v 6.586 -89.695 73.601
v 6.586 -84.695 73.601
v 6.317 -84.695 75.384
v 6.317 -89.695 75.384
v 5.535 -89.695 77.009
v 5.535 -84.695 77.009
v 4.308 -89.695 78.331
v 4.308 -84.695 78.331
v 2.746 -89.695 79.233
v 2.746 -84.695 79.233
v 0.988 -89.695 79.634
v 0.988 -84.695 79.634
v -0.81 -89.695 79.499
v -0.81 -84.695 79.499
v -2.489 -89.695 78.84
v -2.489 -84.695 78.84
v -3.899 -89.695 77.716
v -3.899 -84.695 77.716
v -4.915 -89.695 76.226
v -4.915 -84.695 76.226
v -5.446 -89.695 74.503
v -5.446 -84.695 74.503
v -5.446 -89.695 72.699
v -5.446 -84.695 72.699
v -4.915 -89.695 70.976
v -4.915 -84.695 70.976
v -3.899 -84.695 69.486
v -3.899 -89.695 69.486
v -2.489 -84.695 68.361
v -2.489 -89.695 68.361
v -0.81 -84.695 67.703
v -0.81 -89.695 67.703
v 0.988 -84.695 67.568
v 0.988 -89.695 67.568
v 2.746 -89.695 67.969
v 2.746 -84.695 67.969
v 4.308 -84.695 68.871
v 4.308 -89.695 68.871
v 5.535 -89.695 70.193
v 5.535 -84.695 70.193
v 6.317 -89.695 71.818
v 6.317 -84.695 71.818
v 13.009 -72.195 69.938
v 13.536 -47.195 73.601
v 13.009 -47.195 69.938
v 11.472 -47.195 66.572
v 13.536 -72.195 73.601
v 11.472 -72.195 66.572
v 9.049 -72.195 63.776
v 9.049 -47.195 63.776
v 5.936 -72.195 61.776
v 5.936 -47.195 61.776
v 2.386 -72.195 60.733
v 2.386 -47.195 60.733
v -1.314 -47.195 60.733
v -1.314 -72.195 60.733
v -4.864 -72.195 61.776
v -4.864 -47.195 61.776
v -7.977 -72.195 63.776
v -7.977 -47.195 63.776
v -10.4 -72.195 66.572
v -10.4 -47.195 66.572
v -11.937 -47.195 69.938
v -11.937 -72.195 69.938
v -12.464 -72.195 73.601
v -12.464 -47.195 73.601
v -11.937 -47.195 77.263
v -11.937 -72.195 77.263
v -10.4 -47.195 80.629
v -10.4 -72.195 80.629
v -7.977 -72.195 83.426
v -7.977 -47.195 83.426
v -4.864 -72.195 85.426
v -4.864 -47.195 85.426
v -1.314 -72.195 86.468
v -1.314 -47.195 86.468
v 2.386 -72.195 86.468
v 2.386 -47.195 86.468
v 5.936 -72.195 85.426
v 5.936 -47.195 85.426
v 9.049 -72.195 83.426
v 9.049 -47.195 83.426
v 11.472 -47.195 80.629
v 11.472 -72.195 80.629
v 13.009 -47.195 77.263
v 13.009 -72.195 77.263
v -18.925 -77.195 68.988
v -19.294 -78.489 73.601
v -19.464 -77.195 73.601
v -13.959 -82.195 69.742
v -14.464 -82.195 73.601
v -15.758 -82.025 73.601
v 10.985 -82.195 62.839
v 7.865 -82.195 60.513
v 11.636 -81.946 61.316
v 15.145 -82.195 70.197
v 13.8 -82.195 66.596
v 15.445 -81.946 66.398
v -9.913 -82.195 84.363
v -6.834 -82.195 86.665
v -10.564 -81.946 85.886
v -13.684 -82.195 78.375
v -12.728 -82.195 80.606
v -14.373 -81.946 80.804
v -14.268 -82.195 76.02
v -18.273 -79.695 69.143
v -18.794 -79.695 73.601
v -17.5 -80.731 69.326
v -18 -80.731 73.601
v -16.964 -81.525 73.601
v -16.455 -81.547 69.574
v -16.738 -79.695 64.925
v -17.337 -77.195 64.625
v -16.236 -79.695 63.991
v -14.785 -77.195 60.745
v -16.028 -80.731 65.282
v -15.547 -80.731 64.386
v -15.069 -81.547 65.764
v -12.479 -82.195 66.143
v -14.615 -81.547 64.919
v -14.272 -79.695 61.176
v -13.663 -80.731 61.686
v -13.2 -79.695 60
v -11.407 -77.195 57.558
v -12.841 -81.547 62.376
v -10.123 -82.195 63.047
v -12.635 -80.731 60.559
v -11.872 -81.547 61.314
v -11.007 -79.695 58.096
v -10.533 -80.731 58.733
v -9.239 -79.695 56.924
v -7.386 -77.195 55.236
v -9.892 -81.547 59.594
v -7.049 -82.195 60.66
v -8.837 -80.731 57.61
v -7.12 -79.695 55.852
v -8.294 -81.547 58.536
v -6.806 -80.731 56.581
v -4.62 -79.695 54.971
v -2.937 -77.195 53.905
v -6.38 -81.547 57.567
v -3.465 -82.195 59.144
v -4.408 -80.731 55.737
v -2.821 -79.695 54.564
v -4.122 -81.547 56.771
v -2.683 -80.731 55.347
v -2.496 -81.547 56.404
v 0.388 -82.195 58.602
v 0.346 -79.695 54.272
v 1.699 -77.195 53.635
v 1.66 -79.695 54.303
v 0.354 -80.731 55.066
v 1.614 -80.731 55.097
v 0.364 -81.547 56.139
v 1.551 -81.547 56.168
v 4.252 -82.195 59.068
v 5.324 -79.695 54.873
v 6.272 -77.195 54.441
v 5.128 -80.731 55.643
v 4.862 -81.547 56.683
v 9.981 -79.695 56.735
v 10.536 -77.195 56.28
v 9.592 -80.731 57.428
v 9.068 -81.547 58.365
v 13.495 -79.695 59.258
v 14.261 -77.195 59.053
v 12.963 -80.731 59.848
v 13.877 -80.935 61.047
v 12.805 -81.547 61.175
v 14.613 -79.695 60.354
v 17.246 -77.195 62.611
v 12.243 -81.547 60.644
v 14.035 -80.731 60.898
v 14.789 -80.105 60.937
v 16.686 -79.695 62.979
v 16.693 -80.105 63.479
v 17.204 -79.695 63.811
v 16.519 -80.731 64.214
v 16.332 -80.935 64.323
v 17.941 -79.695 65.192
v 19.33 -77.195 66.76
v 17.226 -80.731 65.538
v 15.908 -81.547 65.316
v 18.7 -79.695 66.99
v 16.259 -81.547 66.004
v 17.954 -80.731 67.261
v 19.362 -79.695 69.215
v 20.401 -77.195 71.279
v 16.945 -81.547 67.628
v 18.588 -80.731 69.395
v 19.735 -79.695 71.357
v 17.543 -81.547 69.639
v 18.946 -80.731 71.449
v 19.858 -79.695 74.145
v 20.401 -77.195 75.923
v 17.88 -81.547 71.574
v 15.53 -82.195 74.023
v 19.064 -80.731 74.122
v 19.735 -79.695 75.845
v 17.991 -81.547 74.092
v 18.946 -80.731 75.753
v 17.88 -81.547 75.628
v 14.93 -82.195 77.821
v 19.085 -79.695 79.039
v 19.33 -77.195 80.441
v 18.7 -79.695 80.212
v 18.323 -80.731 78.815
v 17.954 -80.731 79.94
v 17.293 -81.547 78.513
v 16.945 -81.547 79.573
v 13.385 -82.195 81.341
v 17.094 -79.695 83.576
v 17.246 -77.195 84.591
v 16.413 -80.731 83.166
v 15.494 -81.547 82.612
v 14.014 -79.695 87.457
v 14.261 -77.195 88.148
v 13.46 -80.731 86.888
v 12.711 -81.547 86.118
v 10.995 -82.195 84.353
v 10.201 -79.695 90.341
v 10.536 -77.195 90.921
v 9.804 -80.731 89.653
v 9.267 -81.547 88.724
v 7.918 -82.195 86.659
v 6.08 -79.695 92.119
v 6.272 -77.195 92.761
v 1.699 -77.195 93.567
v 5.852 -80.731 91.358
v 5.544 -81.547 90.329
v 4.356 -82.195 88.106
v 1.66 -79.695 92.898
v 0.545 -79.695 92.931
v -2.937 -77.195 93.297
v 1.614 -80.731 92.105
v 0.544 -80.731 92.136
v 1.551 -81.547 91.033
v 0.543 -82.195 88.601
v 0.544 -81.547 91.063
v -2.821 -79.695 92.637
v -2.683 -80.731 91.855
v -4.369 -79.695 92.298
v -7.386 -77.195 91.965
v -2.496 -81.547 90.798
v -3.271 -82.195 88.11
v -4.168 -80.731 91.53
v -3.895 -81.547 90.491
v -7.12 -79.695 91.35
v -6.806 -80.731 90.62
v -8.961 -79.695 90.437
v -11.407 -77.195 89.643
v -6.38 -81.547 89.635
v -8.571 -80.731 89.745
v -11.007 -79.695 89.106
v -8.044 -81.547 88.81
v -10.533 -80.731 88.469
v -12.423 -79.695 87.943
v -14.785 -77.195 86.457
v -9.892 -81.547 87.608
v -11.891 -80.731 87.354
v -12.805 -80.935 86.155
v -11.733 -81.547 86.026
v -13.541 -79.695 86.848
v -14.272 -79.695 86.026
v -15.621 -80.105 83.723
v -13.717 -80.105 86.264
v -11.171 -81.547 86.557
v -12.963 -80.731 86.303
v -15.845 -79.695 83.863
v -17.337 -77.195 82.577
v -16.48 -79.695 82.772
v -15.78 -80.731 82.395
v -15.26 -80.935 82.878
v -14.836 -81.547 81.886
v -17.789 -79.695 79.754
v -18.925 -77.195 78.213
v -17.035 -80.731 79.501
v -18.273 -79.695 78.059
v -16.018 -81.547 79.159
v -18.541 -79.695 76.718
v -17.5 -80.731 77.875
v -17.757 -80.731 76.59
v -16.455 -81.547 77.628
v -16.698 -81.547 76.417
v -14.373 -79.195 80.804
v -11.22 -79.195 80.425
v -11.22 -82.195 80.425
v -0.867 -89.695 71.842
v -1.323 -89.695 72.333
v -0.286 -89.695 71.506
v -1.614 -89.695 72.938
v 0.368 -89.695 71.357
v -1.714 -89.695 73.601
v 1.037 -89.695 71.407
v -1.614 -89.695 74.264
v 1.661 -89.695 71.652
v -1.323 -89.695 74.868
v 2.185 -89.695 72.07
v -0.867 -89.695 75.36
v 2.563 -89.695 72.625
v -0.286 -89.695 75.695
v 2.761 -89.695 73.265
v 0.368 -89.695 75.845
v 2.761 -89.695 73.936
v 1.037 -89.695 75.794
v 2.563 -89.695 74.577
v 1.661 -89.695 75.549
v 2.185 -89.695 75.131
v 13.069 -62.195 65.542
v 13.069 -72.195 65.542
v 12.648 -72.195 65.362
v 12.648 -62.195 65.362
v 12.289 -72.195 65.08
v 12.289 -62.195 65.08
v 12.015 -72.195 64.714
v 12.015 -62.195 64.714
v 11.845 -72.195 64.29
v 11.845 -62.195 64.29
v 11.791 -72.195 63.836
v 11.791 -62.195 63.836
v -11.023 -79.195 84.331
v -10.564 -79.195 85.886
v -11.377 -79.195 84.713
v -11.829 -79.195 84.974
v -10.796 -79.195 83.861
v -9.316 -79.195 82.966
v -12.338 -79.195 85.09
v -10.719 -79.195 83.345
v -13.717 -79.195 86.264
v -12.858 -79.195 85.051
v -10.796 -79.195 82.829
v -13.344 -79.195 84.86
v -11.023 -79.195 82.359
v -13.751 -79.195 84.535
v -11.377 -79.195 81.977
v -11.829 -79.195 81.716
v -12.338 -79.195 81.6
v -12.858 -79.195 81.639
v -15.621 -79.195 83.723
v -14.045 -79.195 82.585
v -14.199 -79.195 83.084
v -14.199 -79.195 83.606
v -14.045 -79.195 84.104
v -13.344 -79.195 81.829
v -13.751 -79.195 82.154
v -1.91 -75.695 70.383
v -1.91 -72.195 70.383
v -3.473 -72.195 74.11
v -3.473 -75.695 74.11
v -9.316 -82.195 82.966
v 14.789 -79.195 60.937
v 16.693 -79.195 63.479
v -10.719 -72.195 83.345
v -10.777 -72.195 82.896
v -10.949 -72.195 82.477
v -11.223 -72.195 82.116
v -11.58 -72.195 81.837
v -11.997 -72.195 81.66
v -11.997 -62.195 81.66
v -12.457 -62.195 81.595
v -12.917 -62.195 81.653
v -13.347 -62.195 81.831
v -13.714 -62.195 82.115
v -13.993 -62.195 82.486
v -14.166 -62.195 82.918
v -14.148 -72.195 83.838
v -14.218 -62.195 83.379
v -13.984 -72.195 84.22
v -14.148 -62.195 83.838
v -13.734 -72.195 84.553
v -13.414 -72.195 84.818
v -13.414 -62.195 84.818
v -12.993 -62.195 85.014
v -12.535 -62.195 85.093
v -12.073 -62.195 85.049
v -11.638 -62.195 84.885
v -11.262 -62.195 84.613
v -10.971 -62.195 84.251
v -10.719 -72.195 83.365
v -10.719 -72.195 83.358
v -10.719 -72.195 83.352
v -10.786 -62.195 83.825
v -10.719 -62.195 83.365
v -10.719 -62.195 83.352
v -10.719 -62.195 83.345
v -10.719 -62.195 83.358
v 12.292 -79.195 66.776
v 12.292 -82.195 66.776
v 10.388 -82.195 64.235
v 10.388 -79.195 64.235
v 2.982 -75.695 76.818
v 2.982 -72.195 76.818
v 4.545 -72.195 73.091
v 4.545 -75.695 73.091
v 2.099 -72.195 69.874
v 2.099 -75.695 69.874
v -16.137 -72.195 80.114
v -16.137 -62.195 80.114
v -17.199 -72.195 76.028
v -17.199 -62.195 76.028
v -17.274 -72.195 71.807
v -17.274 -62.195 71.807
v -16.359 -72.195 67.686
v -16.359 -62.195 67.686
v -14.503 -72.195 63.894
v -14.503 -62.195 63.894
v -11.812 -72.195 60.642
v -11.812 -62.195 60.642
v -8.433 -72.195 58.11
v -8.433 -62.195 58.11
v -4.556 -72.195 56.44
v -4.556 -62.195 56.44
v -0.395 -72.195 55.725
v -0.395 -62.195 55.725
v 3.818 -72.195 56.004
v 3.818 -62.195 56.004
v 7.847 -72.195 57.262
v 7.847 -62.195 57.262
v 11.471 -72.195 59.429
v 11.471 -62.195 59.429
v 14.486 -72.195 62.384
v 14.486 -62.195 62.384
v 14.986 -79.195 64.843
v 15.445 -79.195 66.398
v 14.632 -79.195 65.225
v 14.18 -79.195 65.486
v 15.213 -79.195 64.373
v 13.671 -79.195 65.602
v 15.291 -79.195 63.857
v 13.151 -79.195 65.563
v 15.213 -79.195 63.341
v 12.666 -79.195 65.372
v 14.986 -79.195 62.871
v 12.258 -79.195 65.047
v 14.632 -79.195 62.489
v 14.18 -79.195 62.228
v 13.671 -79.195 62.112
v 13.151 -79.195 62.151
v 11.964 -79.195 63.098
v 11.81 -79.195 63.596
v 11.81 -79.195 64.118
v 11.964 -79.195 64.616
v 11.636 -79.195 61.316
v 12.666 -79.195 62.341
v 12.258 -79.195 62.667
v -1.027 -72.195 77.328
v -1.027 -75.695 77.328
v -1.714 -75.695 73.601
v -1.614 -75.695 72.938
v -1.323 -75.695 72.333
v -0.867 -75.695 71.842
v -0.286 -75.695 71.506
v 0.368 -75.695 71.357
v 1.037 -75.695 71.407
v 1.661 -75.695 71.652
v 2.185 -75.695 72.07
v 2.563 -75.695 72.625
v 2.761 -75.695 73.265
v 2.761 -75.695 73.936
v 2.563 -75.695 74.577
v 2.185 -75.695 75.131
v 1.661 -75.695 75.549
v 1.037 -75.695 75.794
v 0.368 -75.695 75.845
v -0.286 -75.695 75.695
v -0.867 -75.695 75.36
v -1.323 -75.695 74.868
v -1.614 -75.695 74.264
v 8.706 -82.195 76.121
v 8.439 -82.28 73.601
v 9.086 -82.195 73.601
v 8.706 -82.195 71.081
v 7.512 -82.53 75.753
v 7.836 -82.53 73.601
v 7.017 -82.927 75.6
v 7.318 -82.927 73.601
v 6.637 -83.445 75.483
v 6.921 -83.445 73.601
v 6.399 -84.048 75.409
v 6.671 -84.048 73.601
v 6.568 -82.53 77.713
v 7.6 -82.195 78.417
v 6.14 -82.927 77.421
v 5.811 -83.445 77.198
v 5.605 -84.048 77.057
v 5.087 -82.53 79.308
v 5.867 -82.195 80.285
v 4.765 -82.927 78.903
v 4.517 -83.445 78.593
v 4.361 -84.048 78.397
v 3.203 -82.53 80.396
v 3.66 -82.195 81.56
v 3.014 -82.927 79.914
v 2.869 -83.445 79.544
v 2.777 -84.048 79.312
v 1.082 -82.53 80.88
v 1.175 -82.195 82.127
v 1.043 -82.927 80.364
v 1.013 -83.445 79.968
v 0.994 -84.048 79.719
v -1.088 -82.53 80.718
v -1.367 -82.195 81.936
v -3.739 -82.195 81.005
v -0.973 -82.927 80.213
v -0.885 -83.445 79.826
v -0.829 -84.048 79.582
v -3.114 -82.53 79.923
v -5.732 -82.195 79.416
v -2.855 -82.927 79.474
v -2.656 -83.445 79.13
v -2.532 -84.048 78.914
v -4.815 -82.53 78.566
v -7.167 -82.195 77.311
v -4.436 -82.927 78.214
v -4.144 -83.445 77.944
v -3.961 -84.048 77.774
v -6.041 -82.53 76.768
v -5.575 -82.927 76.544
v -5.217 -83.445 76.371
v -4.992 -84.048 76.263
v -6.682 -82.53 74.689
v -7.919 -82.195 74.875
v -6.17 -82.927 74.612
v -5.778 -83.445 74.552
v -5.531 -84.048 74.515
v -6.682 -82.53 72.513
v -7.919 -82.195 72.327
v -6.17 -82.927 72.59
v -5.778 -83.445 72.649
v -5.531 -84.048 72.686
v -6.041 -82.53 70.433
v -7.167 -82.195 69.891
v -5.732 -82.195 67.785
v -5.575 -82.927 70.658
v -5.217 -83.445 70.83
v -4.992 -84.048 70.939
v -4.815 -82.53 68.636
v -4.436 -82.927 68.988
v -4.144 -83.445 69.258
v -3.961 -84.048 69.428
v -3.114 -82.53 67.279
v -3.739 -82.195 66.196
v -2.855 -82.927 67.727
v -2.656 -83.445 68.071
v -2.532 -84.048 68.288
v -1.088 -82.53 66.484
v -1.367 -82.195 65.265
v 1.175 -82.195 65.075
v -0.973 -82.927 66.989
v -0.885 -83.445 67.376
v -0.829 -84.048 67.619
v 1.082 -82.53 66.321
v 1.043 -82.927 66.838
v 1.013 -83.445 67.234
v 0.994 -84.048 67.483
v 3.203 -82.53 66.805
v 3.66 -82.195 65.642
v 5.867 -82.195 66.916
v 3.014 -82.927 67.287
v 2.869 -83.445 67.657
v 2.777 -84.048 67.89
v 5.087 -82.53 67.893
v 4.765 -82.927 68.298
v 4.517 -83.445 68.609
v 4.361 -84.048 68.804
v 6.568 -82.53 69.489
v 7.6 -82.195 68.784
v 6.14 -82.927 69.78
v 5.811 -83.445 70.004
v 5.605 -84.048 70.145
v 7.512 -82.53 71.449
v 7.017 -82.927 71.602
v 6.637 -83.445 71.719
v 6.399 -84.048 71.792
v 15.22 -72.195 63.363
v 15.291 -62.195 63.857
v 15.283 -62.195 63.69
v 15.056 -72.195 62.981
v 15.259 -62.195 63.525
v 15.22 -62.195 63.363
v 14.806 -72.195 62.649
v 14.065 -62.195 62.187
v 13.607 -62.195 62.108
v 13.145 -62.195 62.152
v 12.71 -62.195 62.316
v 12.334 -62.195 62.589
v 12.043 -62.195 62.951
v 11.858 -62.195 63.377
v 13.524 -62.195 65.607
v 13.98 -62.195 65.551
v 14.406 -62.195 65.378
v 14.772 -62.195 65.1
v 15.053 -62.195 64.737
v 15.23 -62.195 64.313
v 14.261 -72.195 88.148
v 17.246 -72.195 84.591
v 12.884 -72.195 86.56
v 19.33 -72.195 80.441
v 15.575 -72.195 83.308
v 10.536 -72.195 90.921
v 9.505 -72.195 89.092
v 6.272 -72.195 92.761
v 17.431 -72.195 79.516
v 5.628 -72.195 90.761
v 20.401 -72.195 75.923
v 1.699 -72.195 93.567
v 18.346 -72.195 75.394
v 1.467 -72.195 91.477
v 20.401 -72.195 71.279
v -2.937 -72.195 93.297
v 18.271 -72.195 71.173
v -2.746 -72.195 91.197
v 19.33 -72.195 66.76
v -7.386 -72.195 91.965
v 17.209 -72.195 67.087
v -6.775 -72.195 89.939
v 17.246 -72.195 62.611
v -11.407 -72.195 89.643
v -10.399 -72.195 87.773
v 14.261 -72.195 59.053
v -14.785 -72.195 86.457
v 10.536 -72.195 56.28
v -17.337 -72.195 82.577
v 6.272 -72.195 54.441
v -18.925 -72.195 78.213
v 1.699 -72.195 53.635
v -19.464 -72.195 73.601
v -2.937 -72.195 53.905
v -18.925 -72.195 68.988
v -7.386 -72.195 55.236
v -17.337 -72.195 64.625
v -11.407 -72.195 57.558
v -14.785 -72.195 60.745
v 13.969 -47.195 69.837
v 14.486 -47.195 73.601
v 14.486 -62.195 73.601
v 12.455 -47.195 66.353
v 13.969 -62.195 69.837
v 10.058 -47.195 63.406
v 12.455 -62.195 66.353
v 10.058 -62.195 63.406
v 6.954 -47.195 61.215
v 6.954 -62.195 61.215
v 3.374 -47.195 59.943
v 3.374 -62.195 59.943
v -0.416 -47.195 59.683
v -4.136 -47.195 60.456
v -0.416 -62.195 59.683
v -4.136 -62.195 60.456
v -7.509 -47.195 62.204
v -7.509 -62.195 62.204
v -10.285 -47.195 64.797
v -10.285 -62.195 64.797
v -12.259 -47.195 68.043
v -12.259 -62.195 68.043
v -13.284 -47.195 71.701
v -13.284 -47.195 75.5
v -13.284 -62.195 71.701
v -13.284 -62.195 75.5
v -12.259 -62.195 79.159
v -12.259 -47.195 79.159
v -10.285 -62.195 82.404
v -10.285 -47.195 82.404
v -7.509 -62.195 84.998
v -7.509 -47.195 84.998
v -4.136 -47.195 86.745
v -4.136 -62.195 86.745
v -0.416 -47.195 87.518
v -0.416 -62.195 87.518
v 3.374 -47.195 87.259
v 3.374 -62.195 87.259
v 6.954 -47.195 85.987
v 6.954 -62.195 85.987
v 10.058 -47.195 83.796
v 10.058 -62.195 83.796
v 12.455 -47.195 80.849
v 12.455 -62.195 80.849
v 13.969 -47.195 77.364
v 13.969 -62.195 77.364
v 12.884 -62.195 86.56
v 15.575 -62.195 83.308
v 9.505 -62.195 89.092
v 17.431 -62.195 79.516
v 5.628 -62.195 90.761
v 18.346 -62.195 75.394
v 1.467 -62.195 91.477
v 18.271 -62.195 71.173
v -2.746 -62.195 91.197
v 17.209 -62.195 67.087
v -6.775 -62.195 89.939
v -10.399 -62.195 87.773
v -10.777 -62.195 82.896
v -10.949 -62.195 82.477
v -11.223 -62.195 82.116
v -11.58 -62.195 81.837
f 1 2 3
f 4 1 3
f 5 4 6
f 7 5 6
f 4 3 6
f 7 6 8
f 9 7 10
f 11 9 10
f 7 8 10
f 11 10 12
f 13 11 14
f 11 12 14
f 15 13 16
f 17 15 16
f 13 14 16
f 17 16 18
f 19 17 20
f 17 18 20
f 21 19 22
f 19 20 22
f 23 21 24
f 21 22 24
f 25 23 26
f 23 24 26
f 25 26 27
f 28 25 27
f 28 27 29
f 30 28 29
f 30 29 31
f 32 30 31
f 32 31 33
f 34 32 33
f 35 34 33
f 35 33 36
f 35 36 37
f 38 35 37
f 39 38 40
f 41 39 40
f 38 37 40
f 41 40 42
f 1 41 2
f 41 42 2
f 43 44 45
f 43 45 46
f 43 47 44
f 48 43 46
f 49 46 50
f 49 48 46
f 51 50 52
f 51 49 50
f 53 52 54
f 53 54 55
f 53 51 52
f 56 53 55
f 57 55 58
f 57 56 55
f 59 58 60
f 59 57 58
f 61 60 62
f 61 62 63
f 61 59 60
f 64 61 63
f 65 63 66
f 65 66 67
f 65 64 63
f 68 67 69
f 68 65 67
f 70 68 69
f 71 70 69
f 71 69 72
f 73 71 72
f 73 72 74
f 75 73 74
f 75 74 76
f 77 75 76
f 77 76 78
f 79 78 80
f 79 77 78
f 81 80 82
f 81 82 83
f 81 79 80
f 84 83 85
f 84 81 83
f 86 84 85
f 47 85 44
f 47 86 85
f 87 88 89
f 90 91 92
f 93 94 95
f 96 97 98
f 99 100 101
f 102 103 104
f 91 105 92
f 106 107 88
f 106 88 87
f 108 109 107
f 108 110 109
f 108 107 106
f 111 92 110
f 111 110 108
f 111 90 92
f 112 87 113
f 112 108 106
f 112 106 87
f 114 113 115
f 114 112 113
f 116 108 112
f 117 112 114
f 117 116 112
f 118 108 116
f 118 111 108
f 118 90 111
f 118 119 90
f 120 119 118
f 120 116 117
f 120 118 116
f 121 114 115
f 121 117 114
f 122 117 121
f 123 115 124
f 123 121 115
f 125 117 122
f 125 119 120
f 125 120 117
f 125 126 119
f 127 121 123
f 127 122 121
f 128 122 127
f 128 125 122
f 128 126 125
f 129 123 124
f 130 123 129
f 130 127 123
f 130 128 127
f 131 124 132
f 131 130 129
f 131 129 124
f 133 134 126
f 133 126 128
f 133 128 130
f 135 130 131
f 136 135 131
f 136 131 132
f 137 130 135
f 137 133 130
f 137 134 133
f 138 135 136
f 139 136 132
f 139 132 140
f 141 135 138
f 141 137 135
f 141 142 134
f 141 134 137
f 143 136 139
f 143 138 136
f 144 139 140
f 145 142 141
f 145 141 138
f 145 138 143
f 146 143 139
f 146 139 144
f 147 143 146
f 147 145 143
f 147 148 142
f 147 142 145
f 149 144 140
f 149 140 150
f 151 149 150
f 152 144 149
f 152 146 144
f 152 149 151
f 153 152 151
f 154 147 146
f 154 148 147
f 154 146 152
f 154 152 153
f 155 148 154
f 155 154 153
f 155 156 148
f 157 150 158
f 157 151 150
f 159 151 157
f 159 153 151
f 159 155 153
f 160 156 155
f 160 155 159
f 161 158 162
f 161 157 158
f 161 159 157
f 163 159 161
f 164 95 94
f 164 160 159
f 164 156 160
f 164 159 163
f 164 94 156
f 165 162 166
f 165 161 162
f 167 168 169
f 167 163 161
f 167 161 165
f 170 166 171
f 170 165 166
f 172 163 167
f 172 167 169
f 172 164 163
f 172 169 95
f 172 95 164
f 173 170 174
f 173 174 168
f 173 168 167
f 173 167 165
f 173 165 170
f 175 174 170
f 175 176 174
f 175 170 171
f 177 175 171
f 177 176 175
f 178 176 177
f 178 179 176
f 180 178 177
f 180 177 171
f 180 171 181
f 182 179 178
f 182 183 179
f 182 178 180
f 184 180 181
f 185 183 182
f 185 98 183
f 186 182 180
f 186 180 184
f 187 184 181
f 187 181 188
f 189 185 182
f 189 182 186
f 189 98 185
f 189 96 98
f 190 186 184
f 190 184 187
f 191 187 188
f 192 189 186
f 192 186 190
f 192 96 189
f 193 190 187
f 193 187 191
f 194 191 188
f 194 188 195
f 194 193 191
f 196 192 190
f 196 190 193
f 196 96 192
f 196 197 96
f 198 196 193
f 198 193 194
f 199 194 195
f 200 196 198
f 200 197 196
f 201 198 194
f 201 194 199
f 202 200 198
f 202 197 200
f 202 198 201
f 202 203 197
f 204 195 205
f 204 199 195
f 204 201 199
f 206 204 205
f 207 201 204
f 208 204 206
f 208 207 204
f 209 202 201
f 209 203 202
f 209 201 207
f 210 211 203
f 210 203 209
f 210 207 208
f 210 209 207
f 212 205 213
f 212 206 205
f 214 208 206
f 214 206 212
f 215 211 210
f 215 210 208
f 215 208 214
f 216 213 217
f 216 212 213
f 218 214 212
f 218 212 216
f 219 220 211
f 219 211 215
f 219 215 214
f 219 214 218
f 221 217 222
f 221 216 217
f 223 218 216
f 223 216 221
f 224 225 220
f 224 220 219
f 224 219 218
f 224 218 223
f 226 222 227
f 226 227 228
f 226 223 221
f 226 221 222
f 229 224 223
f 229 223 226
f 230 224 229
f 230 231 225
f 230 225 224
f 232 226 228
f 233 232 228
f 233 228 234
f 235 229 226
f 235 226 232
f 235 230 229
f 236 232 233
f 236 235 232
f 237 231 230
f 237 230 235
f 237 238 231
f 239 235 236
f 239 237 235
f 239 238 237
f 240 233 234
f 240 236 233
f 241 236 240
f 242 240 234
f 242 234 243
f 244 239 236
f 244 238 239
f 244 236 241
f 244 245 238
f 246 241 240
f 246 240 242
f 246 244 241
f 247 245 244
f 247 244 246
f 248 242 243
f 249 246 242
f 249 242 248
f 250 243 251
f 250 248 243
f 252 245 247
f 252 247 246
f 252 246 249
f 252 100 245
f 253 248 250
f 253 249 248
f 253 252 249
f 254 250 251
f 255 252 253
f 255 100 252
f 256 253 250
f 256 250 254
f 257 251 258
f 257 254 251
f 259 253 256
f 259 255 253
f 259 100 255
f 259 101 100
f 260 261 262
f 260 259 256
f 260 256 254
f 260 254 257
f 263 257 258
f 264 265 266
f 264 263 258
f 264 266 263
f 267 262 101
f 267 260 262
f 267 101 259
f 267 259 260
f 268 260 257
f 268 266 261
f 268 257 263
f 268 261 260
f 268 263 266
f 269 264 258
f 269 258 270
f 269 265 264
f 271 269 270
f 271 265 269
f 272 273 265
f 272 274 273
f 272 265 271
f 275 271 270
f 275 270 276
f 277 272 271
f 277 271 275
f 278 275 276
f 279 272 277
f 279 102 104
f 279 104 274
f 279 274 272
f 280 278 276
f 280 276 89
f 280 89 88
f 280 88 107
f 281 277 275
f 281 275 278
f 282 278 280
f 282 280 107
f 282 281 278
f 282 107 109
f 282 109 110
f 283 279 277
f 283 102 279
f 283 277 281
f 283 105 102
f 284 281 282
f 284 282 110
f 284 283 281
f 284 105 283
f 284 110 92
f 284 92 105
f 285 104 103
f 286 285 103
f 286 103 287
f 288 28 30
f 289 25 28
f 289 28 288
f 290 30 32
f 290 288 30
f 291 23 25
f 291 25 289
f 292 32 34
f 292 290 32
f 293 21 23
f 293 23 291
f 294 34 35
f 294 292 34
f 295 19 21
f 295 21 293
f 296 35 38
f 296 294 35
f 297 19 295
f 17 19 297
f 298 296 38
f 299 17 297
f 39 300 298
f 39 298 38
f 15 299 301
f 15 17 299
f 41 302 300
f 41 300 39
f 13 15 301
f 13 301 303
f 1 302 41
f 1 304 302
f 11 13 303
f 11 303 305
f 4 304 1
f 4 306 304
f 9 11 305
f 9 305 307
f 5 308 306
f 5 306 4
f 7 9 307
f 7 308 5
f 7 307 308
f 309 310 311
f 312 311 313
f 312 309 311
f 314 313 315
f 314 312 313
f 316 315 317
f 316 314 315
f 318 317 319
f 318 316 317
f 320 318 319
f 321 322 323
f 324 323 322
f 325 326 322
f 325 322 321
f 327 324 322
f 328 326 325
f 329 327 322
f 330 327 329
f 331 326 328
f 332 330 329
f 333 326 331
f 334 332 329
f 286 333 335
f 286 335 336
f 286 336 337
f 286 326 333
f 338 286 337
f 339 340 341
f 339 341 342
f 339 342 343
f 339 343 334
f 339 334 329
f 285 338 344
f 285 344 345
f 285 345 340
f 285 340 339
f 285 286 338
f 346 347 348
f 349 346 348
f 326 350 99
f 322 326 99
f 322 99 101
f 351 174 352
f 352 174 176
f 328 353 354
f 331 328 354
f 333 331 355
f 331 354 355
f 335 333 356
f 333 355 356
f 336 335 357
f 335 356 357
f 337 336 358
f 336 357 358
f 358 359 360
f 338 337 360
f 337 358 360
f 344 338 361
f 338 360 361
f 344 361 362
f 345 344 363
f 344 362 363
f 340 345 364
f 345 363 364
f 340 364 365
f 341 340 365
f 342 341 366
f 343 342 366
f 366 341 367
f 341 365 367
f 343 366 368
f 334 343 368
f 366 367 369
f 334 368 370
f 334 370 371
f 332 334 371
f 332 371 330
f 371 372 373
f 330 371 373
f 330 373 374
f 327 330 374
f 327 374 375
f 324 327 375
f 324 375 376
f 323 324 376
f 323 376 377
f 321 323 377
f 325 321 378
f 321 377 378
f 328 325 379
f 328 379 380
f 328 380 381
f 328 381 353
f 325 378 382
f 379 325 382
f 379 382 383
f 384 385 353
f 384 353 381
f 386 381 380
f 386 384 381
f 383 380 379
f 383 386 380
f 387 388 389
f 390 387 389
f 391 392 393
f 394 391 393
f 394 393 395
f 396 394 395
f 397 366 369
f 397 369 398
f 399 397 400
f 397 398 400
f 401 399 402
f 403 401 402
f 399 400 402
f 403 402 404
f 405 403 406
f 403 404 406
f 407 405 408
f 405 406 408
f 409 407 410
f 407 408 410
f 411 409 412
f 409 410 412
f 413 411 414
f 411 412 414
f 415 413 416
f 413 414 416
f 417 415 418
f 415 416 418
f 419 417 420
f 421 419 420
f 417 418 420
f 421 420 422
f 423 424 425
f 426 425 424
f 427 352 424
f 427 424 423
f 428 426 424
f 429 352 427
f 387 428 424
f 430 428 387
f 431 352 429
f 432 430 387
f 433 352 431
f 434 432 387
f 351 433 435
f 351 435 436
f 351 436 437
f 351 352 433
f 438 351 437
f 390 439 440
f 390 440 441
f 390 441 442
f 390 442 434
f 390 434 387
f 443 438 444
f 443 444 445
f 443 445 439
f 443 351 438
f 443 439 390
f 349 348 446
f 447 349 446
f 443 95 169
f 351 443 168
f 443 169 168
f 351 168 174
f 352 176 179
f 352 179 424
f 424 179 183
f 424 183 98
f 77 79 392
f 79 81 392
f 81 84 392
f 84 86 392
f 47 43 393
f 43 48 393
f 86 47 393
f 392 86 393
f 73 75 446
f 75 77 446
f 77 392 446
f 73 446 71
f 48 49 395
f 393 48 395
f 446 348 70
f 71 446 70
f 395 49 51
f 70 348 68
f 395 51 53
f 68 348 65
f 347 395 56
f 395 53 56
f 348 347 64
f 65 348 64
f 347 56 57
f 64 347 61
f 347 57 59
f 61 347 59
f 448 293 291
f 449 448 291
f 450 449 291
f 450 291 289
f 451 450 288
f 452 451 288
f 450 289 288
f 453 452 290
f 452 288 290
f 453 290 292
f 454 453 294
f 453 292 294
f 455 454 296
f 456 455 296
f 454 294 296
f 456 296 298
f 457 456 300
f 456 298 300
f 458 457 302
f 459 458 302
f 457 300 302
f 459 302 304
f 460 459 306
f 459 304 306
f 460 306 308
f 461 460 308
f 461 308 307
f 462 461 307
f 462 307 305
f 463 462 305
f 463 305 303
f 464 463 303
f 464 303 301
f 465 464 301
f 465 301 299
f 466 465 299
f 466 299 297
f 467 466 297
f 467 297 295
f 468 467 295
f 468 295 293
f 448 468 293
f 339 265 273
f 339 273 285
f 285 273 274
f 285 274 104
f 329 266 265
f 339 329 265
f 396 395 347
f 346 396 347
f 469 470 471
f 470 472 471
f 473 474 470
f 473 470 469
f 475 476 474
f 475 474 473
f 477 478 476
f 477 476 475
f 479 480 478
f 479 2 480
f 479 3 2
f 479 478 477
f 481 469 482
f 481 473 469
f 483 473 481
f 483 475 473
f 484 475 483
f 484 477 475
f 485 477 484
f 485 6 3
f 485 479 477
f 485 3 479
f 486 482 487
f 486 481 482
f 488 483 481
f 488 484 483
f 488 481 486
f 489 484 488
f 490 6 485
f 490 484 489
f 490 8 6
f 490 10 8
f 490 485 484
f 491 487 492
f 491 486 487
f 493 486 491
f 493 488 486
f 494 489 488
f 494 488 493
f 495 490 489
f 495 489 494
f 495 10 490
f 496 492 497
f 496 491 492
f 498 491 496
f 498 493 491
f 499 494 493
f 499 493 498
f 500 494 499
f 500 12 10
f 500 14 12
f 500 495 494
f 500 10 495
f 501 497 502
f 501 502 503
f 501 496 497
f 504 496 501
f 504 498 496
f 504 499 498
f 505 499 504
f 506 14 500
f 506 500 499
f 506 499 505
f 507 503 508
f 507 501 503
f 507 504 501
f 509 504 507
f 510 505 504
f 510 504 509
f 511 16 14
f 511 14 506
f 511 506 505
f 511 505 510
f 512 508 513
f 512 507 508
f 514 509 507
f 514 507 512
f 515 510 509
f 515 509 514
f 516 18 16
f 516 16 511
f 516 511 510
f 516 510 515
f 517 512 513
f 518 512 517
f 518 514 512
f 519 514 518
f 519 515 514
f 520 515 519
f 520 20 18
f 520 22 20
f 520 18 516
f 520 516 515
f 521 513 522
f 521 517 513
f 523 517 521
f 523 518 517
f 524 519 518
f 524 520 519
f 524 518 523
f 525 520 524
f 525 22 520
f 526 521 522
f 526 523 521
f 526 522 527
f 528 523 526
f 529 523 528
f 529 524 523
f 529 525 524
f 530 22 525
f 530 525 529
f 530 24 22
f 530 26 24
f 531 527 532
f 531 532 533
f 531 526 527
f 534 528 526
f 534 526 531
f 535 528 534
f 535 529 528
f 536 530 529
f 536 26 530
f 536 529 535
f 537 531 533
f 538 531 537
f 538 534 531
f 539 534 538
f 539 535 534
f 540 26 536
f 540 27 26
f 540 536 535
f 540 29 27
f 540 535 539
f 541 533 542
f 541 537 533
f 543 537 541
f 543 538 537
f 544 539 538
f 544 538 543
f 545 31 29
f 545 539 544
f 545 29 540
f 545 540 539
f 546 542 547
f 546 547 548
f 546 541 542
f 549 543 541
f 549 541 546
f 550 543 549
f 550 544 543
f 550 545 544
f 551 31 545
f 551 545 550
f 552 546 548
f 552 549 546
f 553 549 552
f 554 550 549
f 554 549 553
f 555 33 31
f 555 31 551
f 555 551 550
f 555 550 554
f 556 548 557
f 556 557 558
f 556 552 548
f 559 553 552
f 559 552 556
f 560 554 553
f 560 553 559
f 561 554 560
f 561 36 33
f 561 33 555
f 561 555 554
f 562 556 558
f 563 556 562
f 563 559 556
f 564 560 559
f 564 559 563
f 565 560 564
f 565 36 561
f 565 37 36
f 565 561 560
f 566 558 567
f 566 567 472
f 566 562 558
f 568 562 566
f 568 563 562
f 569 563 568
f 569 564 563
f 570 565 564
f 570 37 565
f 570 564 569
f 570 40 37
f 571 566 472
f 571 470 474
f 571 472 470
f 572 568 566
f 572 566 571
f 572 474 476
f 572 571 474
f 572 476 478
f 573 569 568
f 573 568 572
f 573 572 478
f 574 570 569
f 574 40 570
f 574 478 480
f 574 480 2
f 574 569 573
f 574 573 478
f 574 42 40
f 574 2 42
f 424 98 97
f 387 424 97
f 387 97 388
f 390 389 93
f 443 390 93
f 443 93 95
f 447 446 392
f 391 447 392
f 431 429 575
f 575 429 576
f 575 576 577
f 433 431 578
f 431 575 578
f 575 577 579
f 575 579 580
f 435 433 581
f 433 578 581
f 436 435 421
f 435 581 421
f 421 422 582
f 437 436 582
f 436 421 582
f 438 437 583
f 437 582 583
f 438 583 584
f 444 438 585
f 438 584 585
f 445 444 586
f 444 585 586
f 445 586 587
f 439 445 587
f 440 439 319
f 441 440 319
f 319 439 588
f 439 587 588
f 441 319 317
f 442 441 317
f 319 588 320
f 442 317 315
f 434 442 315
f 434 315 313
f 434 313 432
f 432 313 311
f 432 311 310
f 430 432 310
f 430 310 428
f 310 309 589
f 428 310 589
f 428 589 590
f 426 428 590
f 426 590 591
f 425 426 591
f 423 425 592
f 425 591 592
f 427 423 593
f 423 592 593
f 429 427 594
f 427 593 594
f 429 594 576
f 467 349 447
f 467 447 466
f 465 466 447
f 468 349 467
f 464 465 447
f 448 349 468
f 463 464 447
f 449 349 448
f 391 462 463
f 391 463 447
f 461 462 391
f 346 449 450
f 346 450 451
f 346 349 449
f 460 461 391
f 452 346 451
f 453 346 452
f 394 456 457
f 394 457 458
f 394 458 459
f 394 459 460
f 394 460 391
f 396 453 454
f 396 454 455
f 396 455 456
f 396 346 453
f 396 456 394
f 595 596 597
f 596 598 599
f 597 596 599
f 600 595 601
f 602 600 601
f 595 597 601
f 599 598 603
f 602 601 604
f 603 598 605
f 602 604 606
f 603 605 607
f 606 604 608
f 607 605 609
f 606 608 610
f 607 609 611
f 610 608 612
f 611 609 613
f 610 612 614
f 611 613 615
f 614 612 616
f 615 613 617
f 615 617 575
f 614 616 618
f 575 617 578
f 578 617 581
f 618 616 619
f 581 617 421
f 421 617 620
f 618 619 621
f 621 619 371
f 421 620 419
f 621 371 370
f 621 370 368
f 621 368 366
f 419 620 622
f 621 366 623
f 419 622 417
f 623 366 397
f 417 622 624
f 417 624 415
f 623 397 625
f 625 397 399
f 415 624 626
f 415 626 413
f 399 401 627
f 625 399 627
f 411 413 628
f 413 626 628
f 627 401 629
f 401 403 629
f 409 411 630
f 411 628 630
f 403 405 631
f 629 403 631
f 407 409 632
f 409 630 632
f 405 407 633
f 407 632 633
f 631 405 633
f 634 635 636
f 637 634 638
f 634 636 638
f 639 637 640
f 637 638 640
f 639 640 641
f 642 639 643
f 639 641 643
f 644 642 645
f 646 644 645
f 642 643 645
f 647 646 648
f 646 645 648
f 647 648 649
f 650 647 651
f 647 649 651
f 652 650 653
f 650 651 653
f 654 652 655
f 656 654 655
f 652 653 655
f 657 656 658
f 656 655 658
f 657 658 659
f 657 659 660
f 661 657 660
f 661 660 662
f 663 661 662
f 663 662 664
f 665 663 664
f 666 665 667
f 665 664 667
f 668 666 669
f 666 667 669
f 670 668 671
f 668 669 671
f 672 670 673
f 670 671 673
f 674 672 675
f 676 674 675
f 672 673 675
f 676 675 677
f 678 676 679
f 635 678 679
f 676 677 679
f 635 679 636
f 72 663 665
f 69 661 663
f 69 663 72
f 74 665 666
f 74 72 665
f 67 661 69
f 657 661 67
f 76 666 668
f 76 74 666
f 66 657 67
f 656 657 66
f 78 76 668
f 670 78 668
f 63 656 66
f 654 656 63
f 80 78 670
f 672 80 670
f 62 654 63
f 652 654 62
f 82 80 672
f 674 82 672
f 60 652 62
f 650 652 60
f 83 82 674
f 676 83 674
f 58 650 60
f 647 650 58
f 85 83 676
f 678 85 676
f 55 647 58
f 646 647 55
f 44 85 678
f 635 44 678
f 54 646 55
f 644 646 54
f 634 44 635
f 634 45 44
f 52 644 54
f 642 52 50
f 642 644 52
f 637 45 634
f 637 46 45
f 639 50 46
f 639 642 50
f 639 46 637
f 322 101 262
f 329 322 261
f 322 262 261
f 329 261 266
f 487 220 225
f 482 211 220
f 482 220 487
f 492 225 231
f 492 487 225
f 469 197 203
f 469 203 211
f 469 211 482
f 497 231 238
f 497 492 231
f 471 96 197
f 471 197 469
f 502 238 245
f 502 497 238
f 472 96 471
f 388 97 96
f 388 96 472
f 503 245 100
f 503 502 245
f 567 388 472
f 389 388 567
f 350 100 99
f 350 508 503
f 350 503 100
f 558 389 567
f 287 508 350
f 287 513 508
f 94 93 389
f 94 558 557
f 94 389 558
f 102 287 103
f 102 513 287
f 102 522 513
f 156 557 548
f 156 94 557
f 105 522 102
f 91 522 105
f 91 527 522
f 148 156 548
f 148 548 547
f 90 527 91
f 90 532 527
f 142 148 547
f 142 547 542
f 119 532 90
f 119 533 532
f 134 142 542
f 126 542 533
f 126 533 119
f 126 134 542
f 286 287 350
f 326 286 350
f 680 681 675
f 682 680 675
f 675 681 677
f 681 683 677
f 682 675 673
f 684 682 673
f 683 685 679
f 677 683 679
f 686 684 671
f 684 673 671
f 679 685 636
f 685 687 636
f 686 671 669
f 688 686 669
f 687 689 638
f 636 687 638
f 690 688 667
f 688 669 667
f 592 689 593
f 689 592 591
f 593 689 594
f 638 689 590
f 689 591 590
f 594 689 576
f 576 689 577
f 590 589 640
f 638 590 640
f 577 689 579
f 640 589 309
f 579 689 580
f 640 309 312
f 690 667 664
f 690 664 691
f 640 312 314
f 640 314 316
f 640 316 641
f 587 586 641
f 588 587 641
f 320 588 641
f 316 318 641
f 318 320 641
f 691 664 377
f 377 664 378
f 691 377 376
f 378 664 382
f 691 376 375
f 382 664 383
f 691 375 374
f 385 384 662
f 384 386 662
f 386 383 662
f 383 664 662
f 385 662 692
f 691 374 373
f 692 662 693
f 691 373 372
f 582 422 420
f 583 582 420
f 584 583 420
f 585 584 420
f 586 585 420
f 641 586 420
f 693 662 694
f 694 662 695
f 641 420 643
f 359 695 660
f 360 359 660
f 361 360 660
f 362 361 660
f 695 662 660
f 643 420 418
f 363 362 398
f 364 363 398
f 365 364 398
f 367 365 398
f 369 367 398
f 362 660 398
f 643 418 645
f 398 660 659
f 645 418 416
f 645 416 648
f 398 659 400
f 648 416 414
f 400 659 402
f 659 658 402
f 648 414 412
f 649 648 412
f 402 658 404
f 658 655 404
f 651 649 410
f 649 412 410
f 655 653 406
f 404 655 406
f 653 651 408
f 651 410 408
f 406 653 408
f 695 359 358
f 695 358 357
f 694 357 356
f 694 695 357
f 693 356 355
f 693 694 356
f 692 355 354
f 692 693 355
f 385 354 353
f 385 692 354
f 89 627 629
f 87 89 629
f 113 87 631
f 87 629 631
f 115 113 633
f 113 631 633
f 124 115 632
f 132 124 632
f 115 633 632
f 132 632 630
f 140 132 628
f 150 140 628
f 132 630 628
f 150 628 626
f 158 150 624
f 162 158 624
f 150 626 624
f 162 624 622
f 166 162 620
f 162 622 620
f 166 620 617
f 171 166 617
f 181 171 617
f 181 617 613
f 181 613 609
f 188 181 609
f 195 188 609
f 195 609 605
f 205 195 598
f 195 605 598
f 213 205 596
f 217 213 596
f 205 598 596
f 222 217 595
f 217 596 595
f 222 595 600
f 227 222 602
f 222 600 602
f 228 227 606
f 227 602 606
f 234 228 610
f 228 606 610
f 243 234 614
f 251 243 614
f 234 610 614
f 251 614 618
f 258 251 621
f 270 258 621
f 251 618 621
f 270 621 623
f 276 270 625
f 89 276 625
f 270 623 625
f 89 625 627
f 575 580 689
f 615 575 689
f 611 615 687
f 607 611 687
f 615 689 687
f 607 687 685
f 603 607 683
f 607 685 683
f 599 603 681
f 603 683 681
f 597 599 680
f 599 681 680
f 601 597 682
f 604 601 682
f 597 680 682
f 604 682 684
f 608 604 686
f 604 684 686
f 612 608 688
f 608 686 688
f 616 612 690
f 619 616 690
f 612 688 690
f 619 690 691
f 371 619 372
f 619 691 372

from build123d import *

# Parameters (mm, degrees)
SKETCH1_R               = 17.9
SKETCH1_R_2             = 14.9
BOSS_EXTRUDE1_DEPTH     = 10
SKETCH2_R               = 20
BOSS_EXTRUDE2_DEPTH     = 10
FILLET1_R               = 5
SKETCH3_R               = 1.75
CUT_EXTRUDE1_DEPTH      = 1
CUT_EXTRUDE1_DEPTH_BACK = 332.06387935
CUT_EXTRUDE3_DEPTH      = 3
SKETCH8_R               = 13
BOSS_EXTRUDE3_DEPTH     = 10
SKETCH9_R               = 6.05
BOSS_EXTRUDE4_DEPTH     = 7.5
FILLET2_R               = 2.5
SKETCH11_R              = 2.25
CUT_EXTRUDE4_DEPTH      = 17.5
CUT_EXTRUDE5_DEPTH      = 3.5
SKETCH13_R              = 13.95
SKETCH13_R_2            = 13
BOSS_EXTRUDE5_DEPTH     = 15


with BuildPart() as part:
    # Sketch1 → Boss-Extrude1 (new body)
    with BuildSketch(Plane(origin=(0, -62.195205507, 0), x_dir=(-1, 0, 0), z_dir=(0, -1, 0))):
        with Locations((-0.536002938, -73.600816835)):
            Circle(SKETCH1_R)
        with Locations((-0.536002938, -73.600816835)):
            Circle(SKETCH1_R_2, mode=Mode.SUBTRACT)
    extrude(amount=BOSS_EXTRUDE1_DEPTH)

    # Sketch2 → Boss-Extrude2 (add)
    with BuildSketch(Plane(origin=(0, -72.195205507, 0), x_dir=(-1, 0, 0), z_dir=(0, -1, 0))):
        with Locations((-0.536002938, -73.600816835)):
            Circle(SKETCH2_R)
    extrude(amount=BOSS_EXTRUDE2_DEPTH)

    # Fillet1
    fillet1_edges = [part.edges().sort_by_distance(p)[0] for p in [
        (20.536002938, -82.195205507, 73.600816835),
    ]]
    fillet(fillet1_edges, radius=FILLET1_R)

    # Sketch3 → Cut-Extrude1 (cut, two sides)
    with BuildSketch(Plane(origin=(0, 248.868673843, 0), x_dir=(1, 0, 0), z_dir=(0, 1, 0))) as cut_extrude1_sk:
        with Locations((-12.468535925, -83.344762082)):
            Circle(SKETCH3_R)
        with Locations((13.5405418, -63.856871588)):
            Circle(SKETCH3_R)
    extrude(amount=CUT_EXTRUDE1_DEPTH, mode=Mode.SUBTRACT)
    extrude(cut_extrude1_sk.sketch, amount=-CUT_EXTRUDE1_DEPTH_BACK, mode=Mode.SUBTRACT)

    # Sketch7 → Cut-Extrude3 (cut)
    with BuildSketch(Plane(origin=(0, -82.195205507, 0), x_dir=(-1, 0, 0), z_dir=(0, -1, 0))):
        Polygon((10.564463201, -85.88599021), (13.717267678, -86.264351495), (15.621340402, -83.723123368), (14.372608649, -80.803533955), (11.219804171, -80.425172669), (9.315731448, -82.966400796), align=None)
        Polygon((-15.444614524, -66.398099716), (-12.291810047, -66.776461002), (-10.387737323, -64.235232874), (-11.636469076, -61.315643461), (-14.789273554, -60.937282175), (-16.693346277, -63.478510303), align=None)
    extrude(amount=-CUT_EXTRUDE3_DEPTH, mode=Mode.SUBTRACT)

    # Sketch8 → Boss-Extrude3 (add)
    with BuildSketch(Plane(origin=(0, -62.195205507, 0), x_dir=(1, 0, 0), z_dir=(0, 1, 0))):
        with BuildLine():
            ThreePointArc((16.682247488, -73.600816835), (16.107712715, -69.331968315), (14.424995948, -65.36691823))
            ThreePointArc((14.424995948, -65.36691823), (12.661441741, -65.370041468), (11.790660849, -63.836459442))
            ThreePointArc((11.790660849, -63.836459442), (-8.398445319, -61.676655048), (-11.996595259, -81.659599773))
            ThreePointArc((-11.996595259, -81.659599773), (-11.074190888, -82.287264131), (-10.718535925, -83.344762082))
            ThreePointArc((-10.718535925, -83.344762082), (-10.861687777, -84.037971309), (-11.267723389, -84.617770038))
            ThreePointArc((-11.267723389, -84.617770038), (6.456955614, -88.622252601), (16.682247488, -73.600816835))
        make_face()
        with Locations((0.536002938, -73.600816835)):
            Circle(SKETCH8_R, mode=Mode.SUBTRACT)
    extrude(amount=-BOSS_EXTRUDE3_DEPTH)

    # Sketch9 → Boss-Extrude4 (add)
    with BuildSketch(Plane.XZ.offset(82.195205507)):
        with Locations((0.536002938, 73.600816835)):
            Circle(SKETCH9_R)
    extrude(amount=BOSS_EXTRUDE4_DEPTH)

    # Fillet2
    fillet2_edges = [part.edges().sort_by_distance(p)[0] for p in [
        (-5.513997062, -82.195205507, 73.600816835),
    ]]
    fillet(fillet2_edges, radius=FILLET2_R)

    # Sketch11 → Cut-Extrude4 (cut)
    with BuildSketch(Plane(origin=(0, -89.695205507, 0), x_dir=(-1, 0, 0), z_dir=(0, -1, 0))):
        with Locations((-0.536002938, -73.600816835)):
            Circle(SKETCH11_R)
    extrude(amount=-CUT_EXTRUDE4_DEPTH, mode=Mode.SUBTRACT)

    # Sketch12 → Cut-Extrude5 (cut)
    with BuildSketch(Plane(origin=(0, -72.195205507, 0), x_dir=(1, 0, 0), z_dir=(0, 1, 0))):
        Polygon((2.981769599, -76.818200675), (4.545222407, -73.091412695), (2.099455746, -69.874028855), (-1.909763723, -70.383432996), (-3.473216532, -74.110220976), (-1.027449871, -77.327604816), align=None)
    extrude(amount=-CUT_EXTRUDE5_DEPTH, mode=Mode.SUBTRACT)

    # Sketch13 → Boss-Extrude5 (add)
    with BuildSketch(Plane(origin=(0, -62.195205507, 0), x_dir=(1, 0, 0), z_dir=(0, 1, 0))):
        with Locations((0.536002938, -73.600816835)):
            Circle(SKETCH13_R)
        with Locations((0.536002938, -73.600816835)):
            Circle(SKETCH13_R_2, mode=Mode.SUBTRACT)
    extrude(amount=BOSS_EXTRUDE5_DEPTH)


solid = part.part
